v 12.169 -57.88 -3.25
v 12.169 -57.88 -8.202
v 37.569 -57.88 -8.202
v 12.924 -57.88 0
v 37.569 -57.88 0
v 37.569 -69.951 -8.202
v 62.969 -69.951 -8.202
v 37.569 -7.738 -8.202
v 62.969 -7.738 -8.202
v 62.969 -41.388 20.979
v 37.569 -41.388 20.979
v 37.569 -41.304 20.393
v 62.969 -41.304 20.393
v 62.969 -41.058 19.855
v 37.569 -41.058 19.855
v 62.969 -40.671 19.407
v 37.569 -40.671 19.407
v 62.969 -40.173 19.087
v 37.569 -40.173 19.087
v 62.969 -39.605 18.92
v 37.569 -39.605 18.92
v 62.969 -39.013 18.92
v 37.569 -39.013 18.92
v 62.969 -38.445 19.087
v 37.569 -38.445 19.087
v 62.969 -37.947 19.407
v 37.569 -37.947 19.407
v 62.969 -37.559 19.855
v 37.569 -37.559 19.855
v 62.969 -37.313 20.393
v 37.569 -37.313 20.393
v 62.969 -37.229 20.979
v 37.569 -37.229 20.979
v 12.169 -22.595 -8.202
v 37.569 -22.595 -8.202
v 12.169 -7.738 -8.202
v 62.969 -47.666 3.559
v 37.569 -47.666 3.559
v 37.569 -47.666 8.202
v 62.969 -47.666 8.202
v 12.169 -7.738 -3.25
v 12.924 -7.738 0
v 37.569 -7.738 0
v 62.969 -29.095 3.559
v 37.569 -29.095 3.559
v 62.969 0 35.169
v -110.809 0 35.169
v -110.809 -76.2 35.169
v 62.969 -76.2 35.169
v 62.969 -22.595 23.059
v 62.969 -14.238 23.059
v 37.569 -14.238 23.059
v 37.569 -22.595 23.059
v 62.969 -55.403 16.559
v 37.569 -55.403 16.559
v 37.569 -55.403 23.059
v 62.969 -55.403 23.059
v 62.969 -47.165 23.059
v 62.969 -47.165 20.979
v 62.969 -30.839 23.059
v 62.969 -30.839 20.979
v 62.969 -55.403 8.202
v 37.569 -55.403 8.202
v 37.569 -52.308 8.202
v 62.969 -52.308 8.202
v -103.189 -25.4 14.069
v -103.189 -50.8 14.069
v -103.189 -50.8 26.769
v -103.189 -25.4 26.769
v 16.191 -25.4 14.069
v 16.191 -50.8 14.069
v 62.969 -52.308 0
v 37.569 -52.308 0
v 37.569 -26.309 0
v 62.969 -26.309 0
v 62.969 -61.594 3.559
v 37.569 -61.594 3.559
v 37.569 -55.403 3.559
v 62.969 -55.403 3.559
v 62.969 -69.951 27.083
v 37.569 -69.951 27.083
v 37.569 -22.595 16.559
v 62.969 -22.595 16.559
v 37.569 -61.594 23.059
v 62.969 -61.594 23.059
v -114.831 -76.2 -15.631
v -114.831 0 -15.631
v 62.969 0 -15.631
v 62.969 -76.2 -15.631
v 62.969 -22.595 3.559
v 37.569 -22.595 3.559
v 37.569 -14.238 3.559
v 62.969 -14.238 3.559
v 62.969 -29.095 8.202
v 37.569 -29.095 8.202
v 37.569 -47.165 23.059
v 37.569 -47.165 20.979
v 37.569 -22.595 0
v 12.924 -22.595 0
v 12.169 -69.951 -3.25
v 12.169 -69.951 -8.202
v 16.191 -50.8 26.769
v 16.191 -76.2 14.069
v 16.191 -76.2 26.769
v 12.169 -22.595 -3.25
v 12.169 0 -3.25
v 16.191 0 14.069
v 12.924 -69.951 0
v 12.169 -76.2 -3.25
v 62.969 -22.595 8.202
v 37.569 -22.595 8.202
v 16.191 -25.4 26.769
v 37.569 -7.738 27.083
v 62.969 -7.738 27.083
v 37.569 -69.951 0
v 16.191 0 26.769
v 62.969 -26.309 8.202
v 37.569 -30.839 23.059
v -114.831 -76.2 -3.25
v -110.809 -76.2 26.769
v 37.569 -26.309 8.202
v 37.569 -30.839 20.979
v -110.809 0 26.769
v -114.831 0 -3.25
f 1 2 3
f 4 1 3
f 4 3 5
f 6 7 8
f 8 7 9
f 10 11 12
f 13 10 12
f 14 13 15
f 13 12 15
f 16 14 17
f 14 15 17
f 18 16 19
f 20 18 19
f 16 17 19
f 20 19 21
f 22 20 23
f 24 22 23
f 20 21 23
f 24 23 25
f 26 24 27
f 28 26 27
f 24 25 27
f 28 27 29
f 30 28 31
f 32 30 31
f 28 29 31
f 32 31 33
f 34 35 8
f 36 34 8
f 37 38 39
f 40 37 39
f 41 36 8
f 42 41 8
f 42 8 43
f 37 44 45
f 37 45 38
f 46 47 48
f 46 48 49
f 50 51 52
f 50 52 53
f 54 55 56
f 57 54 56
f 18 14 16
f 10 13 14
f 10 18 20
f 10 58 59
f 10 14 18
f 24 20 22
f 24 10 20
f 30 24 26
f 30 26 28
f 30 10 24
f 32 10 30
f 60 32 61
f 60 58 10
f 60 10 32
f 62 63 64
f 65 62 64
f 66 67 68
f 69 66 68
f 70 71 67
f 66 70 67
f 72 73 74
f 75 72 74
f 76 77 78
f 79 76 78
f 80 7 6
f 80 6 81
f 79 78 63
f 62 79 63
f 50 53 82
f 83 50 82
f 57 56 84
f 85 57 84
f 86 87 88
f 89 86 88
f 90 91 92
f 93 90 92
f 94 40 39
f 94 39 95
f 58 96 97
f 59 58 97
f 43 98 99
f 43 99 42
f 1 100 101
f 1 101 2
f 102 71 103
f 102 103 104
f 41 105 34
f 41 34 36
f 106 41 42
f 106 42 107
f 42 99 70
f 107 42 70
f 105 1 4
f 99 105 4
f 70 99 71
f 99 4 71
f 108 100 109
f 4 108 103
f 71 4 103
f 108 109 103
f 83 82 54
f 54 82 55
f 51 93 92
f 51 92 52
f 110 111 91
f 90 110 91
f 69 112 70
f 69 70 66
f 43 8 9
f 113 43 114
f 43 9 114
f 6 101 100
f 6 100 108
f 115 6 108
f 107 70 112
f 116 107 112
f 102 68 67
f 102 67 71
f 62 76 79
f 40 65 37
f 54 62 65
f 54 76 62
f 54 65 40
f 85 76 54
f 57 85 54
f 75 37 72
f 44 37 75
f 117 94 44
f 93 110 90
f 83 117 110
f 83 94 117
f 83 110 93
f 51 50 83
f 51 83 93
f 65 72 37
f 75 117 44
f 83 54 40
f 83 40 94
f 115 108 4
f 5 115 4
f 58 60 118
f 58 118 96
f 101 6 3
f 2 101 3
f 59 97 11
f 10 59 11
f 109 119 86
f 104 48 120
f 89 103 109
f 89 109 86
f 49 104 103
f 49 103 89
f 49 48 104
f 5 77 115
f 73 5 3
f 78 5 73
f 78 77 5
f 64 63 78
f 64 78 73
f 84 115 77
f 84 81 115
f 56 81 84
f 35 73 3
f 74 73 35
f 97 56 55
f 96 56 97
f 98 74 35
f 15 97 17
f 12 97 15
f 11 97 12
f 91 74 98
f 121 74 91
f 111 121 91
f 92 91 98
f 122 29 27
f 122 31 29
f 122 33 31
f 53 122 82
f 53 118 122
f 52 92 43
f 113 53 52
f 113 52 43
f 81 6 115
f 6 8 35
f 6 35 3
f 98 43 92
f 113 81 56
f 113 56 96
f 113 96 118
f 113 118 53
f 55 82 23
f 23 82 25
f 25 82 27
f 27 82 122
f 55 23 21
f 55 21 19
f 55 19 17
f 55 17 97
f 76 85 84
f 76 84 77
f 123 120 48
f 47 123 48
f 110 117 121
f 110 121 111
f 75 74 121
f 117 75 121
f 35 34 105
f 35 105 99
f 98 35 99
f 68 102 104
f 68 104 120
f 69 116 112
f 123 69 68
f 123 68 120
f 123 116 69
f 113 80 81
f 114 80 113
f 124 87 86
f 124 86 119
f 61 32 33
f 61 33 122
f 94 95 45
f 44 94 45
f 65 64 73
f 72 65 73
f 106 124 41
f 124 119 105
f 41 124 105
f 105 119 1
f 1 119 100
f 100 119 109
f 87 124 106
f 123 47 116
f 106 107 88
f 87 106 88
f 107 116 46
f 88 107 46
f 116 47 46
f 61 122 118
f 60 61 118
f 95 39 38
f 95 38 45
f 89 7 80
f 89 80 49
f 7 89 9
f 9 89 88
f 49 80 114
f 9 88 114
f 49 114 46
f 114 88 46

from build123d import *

# Parameters (mm, degrees)
F0_W      = 177.8
F0_H      = 50.8
F1_DEPTH  = 76.2
F3_DEPTH  = 76.2
F4_W      = 119.38
F4_H      = 12.7
F5_DEPTH  = 25.4
F6_W      = 119.38
F6_H      = 12.7
F7_DEPTH  = 25.4
F8_W      = 62.212805
F8_H      = 35.284875
F9_DEPTH  = 25.4
F10_W     = 12.07114
F10_H     = 8.202186
F10_W_2   = 14.85679
F11_DEPTH = 25.4
F13_DEPTH = 25.4


with BuildPart() as f1:
    # F0 (on Front) → F1 (new body)
    with BuildSketch(Plane.XZ):
        with Locations((-25.930598, 9.76942)):
            Rectangle(F0_W, F0_H)
    extrude(amount=F1_DEPTH)

    # F2 (on face) → F3 (cut)
    with BuildSketch(Plane.XZ.offset(76.2)):
        Polygon((-114.830598, 35.16942), (-114.830598, -3.249923), (12.169402, -3.249923), (16.191416, 14.069194), (-103.188584, 14.069194), (-103.188584, 26.769194), (-110.808584, 26.769194), (-110.808584, 35.16942), align=None)
    extrude(amount=-F3_DEPTH, mode=Mode.SUBTRACT)

    # F4 (on face) → F5 (cut)
    with BuildSketch(Plane.XZ.offset(76.2)):
        with Locations((-43.498584, 20.419194)):
            Rectangle(F4_W, F4_H)
    extrude(amount=-F5_DEPTH, mode=Mode.SUBTRACT)

    # F6 (on face) → F7 (cut)
    with BuildSketch(Plane(origin=(0, 0, 0), x_dir=(-1, 0, 0), z_dir=(0, 1, 0))):
        with Locations((43.498584, 20.419194)):
            Rectangle(F6_W, F6_H)
    extrude(amount=-F7_DEPTH, mode=Mode.SUBTRACT)

    # F8 (on face) → F9 (cut)
    with BuildSketch(Plane.YZ.offset(62.969402)):
        with Locations((-38.844313, 9.440251)):
            Rectangle(F8_W, F8_H)
    extrude(amount=-F9_DEPTH, mode=Mode.SUBTRACT)

    # F10 (on face) → F11 (cut)
    with BuildSketch(Plane.YZ.offset(37.569402)):
        with Locations((-63.915145, -4.101093)):
            Rectangle(F10_W, F10_H)
        with Locations((-15.166305, -4.101093)):
            Rectangle(F10_W_2, F10_H)
    extrude(amount=-F11_DEPTH, mode=Mode.SUBTRACT)

    # F12 (on face) → F13 (join)
    with BuildSketch(Plane.YZ.offset(37.569402)):
        Polygon((-55.403445, 23.058975), (-61.593771, 23.058975), (-61.593771, 3.559439), (-55.403445, 3.559439), (-55.403445, 8.202186), (-52.30828, 8.202186), (-52.30828, 16.55913), (-55.403445, 16.55913), align=None)
        Polygon((-26.308898, 16.55913), (-52.30828, 16.55913), (-52.30828, 8.202186), (-47.665533, 8.202186), (-29.094545, 8.202186), (-26.308898, 8.202186), align=None)
        Polygon((-47.665533, 8.202186), (-52.30828, 8.202186), (-52.30828, 0), (-26.308898, 0), (-26.308898, 8.202186), (-29.094545, 8.202186), (-29.094545, 3.559439), (-47.665533, 3.559439), align=None)
        with BuildLine():
            ThreePointArc((-41.38843, 20.979134), (-39.308589, 18.899294), (-37.228748, 20.979134))
            Line((-37.228748, 20.979134), (-41.38843, 20.979134))
        make_face()
        with BuildLine():
            Line((-41.38843, 20.979134), (-37.228748, 20.979134))
            ThreePointArc((-37.228748, 20.979134), (-37.837919, 22.449804), (-39.308589, 23.058975))
            ThreePointArc((-39.308589, 23.058975), (-40.779258, 22.449804), (-41.38843, 20.979134))
        make_face()
        with BuildLine():
            ThreePointArc((-41.38843, 20.979134), (-40.779258, 22.449804), (-39.308589, 23.058975))
            Line((-39.308589, 23.058975), (-47.165178, 23.058975))
            Line((-47.165178, 23.058975), (-47.165178, 20.979134))
            Line((-47.165178, 20.979134), (-41.38843, 20.979134))
        make_face()
        with BuildLine():
            ThreePointArc((-39.308589, 23.058975), (-37.837919, 22.449804), (-37.228748, 20.979134))
            Line((-37.228748, 20.979134), (-30.838896, 20.979134))
            Line((-30.838896, 20.979134), (-30.838896, 23.058975))
            Line((-30.838896, 23.058975), (-39.308589, 23.058975))
        make_face()
        Polygon((-22.5947, 16.55913), (-26.308898, 16.55913), (-26.308898, 8.202186), (-22.5947, 8.202186), (-22.5947, 3.559439), (-14.237756, 3.559439), (-14.237756, 23.058975), (-22.5947, 23.058975), align=None)
    extrude(amount=F13_DEPTH)


solid = f1.part
